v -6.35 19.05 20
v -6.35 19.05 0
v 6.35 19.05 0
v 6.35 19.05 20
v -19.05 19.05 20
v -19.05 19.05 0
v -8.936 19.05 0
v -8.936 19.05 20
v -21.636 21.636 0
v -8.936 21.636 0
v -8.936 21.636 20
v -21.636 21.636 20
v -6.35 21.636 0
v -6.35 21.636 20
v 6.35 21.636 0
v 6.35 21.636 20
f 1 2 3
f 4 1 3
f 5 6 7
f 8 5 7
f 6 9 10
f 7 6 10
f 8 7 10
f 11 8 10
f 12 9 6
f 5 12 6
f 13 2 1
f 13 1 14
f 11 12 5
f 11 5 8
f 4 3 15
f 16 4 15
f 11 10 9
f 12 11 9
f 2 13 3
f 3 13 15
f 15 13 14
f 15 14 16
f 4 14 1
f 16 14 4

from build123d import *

# Parameters (mm, degrees)
BOSS_EXTRUDE1_DEPTH   = 20
SKETCH1_W             = 12.7
SKETCH1_H             = 2.5861
BOSS_EXTRUDE1_2_DEPTH = 20


with BuildPart() as part:
    # Sketch1 → Boss-Extrude1 (new body)
    with BuildSketch(Plane.XY):
        Polygon((-8.9361, 21.6361), (-21.6361, 21.6361), (-19.05, 19.05), (-8.9361, 19.05), align=None)
    extrude(amount=BOSS_EXTRUDE1_DEPTH)


with BuildPart() as body_2:
    # Sketch1 → Boss-Extrude1 2 (new body)
    with BuildSketch(Plane.XY):
        with Locations((0, 20.34305)):
            Rectangle(SKETCH1_W, SKETCH1_H)
    extrude(amount=BOSS_EXTRUDE1_2_DEPTH)


solid = Compound([part.part, body_2.part])
